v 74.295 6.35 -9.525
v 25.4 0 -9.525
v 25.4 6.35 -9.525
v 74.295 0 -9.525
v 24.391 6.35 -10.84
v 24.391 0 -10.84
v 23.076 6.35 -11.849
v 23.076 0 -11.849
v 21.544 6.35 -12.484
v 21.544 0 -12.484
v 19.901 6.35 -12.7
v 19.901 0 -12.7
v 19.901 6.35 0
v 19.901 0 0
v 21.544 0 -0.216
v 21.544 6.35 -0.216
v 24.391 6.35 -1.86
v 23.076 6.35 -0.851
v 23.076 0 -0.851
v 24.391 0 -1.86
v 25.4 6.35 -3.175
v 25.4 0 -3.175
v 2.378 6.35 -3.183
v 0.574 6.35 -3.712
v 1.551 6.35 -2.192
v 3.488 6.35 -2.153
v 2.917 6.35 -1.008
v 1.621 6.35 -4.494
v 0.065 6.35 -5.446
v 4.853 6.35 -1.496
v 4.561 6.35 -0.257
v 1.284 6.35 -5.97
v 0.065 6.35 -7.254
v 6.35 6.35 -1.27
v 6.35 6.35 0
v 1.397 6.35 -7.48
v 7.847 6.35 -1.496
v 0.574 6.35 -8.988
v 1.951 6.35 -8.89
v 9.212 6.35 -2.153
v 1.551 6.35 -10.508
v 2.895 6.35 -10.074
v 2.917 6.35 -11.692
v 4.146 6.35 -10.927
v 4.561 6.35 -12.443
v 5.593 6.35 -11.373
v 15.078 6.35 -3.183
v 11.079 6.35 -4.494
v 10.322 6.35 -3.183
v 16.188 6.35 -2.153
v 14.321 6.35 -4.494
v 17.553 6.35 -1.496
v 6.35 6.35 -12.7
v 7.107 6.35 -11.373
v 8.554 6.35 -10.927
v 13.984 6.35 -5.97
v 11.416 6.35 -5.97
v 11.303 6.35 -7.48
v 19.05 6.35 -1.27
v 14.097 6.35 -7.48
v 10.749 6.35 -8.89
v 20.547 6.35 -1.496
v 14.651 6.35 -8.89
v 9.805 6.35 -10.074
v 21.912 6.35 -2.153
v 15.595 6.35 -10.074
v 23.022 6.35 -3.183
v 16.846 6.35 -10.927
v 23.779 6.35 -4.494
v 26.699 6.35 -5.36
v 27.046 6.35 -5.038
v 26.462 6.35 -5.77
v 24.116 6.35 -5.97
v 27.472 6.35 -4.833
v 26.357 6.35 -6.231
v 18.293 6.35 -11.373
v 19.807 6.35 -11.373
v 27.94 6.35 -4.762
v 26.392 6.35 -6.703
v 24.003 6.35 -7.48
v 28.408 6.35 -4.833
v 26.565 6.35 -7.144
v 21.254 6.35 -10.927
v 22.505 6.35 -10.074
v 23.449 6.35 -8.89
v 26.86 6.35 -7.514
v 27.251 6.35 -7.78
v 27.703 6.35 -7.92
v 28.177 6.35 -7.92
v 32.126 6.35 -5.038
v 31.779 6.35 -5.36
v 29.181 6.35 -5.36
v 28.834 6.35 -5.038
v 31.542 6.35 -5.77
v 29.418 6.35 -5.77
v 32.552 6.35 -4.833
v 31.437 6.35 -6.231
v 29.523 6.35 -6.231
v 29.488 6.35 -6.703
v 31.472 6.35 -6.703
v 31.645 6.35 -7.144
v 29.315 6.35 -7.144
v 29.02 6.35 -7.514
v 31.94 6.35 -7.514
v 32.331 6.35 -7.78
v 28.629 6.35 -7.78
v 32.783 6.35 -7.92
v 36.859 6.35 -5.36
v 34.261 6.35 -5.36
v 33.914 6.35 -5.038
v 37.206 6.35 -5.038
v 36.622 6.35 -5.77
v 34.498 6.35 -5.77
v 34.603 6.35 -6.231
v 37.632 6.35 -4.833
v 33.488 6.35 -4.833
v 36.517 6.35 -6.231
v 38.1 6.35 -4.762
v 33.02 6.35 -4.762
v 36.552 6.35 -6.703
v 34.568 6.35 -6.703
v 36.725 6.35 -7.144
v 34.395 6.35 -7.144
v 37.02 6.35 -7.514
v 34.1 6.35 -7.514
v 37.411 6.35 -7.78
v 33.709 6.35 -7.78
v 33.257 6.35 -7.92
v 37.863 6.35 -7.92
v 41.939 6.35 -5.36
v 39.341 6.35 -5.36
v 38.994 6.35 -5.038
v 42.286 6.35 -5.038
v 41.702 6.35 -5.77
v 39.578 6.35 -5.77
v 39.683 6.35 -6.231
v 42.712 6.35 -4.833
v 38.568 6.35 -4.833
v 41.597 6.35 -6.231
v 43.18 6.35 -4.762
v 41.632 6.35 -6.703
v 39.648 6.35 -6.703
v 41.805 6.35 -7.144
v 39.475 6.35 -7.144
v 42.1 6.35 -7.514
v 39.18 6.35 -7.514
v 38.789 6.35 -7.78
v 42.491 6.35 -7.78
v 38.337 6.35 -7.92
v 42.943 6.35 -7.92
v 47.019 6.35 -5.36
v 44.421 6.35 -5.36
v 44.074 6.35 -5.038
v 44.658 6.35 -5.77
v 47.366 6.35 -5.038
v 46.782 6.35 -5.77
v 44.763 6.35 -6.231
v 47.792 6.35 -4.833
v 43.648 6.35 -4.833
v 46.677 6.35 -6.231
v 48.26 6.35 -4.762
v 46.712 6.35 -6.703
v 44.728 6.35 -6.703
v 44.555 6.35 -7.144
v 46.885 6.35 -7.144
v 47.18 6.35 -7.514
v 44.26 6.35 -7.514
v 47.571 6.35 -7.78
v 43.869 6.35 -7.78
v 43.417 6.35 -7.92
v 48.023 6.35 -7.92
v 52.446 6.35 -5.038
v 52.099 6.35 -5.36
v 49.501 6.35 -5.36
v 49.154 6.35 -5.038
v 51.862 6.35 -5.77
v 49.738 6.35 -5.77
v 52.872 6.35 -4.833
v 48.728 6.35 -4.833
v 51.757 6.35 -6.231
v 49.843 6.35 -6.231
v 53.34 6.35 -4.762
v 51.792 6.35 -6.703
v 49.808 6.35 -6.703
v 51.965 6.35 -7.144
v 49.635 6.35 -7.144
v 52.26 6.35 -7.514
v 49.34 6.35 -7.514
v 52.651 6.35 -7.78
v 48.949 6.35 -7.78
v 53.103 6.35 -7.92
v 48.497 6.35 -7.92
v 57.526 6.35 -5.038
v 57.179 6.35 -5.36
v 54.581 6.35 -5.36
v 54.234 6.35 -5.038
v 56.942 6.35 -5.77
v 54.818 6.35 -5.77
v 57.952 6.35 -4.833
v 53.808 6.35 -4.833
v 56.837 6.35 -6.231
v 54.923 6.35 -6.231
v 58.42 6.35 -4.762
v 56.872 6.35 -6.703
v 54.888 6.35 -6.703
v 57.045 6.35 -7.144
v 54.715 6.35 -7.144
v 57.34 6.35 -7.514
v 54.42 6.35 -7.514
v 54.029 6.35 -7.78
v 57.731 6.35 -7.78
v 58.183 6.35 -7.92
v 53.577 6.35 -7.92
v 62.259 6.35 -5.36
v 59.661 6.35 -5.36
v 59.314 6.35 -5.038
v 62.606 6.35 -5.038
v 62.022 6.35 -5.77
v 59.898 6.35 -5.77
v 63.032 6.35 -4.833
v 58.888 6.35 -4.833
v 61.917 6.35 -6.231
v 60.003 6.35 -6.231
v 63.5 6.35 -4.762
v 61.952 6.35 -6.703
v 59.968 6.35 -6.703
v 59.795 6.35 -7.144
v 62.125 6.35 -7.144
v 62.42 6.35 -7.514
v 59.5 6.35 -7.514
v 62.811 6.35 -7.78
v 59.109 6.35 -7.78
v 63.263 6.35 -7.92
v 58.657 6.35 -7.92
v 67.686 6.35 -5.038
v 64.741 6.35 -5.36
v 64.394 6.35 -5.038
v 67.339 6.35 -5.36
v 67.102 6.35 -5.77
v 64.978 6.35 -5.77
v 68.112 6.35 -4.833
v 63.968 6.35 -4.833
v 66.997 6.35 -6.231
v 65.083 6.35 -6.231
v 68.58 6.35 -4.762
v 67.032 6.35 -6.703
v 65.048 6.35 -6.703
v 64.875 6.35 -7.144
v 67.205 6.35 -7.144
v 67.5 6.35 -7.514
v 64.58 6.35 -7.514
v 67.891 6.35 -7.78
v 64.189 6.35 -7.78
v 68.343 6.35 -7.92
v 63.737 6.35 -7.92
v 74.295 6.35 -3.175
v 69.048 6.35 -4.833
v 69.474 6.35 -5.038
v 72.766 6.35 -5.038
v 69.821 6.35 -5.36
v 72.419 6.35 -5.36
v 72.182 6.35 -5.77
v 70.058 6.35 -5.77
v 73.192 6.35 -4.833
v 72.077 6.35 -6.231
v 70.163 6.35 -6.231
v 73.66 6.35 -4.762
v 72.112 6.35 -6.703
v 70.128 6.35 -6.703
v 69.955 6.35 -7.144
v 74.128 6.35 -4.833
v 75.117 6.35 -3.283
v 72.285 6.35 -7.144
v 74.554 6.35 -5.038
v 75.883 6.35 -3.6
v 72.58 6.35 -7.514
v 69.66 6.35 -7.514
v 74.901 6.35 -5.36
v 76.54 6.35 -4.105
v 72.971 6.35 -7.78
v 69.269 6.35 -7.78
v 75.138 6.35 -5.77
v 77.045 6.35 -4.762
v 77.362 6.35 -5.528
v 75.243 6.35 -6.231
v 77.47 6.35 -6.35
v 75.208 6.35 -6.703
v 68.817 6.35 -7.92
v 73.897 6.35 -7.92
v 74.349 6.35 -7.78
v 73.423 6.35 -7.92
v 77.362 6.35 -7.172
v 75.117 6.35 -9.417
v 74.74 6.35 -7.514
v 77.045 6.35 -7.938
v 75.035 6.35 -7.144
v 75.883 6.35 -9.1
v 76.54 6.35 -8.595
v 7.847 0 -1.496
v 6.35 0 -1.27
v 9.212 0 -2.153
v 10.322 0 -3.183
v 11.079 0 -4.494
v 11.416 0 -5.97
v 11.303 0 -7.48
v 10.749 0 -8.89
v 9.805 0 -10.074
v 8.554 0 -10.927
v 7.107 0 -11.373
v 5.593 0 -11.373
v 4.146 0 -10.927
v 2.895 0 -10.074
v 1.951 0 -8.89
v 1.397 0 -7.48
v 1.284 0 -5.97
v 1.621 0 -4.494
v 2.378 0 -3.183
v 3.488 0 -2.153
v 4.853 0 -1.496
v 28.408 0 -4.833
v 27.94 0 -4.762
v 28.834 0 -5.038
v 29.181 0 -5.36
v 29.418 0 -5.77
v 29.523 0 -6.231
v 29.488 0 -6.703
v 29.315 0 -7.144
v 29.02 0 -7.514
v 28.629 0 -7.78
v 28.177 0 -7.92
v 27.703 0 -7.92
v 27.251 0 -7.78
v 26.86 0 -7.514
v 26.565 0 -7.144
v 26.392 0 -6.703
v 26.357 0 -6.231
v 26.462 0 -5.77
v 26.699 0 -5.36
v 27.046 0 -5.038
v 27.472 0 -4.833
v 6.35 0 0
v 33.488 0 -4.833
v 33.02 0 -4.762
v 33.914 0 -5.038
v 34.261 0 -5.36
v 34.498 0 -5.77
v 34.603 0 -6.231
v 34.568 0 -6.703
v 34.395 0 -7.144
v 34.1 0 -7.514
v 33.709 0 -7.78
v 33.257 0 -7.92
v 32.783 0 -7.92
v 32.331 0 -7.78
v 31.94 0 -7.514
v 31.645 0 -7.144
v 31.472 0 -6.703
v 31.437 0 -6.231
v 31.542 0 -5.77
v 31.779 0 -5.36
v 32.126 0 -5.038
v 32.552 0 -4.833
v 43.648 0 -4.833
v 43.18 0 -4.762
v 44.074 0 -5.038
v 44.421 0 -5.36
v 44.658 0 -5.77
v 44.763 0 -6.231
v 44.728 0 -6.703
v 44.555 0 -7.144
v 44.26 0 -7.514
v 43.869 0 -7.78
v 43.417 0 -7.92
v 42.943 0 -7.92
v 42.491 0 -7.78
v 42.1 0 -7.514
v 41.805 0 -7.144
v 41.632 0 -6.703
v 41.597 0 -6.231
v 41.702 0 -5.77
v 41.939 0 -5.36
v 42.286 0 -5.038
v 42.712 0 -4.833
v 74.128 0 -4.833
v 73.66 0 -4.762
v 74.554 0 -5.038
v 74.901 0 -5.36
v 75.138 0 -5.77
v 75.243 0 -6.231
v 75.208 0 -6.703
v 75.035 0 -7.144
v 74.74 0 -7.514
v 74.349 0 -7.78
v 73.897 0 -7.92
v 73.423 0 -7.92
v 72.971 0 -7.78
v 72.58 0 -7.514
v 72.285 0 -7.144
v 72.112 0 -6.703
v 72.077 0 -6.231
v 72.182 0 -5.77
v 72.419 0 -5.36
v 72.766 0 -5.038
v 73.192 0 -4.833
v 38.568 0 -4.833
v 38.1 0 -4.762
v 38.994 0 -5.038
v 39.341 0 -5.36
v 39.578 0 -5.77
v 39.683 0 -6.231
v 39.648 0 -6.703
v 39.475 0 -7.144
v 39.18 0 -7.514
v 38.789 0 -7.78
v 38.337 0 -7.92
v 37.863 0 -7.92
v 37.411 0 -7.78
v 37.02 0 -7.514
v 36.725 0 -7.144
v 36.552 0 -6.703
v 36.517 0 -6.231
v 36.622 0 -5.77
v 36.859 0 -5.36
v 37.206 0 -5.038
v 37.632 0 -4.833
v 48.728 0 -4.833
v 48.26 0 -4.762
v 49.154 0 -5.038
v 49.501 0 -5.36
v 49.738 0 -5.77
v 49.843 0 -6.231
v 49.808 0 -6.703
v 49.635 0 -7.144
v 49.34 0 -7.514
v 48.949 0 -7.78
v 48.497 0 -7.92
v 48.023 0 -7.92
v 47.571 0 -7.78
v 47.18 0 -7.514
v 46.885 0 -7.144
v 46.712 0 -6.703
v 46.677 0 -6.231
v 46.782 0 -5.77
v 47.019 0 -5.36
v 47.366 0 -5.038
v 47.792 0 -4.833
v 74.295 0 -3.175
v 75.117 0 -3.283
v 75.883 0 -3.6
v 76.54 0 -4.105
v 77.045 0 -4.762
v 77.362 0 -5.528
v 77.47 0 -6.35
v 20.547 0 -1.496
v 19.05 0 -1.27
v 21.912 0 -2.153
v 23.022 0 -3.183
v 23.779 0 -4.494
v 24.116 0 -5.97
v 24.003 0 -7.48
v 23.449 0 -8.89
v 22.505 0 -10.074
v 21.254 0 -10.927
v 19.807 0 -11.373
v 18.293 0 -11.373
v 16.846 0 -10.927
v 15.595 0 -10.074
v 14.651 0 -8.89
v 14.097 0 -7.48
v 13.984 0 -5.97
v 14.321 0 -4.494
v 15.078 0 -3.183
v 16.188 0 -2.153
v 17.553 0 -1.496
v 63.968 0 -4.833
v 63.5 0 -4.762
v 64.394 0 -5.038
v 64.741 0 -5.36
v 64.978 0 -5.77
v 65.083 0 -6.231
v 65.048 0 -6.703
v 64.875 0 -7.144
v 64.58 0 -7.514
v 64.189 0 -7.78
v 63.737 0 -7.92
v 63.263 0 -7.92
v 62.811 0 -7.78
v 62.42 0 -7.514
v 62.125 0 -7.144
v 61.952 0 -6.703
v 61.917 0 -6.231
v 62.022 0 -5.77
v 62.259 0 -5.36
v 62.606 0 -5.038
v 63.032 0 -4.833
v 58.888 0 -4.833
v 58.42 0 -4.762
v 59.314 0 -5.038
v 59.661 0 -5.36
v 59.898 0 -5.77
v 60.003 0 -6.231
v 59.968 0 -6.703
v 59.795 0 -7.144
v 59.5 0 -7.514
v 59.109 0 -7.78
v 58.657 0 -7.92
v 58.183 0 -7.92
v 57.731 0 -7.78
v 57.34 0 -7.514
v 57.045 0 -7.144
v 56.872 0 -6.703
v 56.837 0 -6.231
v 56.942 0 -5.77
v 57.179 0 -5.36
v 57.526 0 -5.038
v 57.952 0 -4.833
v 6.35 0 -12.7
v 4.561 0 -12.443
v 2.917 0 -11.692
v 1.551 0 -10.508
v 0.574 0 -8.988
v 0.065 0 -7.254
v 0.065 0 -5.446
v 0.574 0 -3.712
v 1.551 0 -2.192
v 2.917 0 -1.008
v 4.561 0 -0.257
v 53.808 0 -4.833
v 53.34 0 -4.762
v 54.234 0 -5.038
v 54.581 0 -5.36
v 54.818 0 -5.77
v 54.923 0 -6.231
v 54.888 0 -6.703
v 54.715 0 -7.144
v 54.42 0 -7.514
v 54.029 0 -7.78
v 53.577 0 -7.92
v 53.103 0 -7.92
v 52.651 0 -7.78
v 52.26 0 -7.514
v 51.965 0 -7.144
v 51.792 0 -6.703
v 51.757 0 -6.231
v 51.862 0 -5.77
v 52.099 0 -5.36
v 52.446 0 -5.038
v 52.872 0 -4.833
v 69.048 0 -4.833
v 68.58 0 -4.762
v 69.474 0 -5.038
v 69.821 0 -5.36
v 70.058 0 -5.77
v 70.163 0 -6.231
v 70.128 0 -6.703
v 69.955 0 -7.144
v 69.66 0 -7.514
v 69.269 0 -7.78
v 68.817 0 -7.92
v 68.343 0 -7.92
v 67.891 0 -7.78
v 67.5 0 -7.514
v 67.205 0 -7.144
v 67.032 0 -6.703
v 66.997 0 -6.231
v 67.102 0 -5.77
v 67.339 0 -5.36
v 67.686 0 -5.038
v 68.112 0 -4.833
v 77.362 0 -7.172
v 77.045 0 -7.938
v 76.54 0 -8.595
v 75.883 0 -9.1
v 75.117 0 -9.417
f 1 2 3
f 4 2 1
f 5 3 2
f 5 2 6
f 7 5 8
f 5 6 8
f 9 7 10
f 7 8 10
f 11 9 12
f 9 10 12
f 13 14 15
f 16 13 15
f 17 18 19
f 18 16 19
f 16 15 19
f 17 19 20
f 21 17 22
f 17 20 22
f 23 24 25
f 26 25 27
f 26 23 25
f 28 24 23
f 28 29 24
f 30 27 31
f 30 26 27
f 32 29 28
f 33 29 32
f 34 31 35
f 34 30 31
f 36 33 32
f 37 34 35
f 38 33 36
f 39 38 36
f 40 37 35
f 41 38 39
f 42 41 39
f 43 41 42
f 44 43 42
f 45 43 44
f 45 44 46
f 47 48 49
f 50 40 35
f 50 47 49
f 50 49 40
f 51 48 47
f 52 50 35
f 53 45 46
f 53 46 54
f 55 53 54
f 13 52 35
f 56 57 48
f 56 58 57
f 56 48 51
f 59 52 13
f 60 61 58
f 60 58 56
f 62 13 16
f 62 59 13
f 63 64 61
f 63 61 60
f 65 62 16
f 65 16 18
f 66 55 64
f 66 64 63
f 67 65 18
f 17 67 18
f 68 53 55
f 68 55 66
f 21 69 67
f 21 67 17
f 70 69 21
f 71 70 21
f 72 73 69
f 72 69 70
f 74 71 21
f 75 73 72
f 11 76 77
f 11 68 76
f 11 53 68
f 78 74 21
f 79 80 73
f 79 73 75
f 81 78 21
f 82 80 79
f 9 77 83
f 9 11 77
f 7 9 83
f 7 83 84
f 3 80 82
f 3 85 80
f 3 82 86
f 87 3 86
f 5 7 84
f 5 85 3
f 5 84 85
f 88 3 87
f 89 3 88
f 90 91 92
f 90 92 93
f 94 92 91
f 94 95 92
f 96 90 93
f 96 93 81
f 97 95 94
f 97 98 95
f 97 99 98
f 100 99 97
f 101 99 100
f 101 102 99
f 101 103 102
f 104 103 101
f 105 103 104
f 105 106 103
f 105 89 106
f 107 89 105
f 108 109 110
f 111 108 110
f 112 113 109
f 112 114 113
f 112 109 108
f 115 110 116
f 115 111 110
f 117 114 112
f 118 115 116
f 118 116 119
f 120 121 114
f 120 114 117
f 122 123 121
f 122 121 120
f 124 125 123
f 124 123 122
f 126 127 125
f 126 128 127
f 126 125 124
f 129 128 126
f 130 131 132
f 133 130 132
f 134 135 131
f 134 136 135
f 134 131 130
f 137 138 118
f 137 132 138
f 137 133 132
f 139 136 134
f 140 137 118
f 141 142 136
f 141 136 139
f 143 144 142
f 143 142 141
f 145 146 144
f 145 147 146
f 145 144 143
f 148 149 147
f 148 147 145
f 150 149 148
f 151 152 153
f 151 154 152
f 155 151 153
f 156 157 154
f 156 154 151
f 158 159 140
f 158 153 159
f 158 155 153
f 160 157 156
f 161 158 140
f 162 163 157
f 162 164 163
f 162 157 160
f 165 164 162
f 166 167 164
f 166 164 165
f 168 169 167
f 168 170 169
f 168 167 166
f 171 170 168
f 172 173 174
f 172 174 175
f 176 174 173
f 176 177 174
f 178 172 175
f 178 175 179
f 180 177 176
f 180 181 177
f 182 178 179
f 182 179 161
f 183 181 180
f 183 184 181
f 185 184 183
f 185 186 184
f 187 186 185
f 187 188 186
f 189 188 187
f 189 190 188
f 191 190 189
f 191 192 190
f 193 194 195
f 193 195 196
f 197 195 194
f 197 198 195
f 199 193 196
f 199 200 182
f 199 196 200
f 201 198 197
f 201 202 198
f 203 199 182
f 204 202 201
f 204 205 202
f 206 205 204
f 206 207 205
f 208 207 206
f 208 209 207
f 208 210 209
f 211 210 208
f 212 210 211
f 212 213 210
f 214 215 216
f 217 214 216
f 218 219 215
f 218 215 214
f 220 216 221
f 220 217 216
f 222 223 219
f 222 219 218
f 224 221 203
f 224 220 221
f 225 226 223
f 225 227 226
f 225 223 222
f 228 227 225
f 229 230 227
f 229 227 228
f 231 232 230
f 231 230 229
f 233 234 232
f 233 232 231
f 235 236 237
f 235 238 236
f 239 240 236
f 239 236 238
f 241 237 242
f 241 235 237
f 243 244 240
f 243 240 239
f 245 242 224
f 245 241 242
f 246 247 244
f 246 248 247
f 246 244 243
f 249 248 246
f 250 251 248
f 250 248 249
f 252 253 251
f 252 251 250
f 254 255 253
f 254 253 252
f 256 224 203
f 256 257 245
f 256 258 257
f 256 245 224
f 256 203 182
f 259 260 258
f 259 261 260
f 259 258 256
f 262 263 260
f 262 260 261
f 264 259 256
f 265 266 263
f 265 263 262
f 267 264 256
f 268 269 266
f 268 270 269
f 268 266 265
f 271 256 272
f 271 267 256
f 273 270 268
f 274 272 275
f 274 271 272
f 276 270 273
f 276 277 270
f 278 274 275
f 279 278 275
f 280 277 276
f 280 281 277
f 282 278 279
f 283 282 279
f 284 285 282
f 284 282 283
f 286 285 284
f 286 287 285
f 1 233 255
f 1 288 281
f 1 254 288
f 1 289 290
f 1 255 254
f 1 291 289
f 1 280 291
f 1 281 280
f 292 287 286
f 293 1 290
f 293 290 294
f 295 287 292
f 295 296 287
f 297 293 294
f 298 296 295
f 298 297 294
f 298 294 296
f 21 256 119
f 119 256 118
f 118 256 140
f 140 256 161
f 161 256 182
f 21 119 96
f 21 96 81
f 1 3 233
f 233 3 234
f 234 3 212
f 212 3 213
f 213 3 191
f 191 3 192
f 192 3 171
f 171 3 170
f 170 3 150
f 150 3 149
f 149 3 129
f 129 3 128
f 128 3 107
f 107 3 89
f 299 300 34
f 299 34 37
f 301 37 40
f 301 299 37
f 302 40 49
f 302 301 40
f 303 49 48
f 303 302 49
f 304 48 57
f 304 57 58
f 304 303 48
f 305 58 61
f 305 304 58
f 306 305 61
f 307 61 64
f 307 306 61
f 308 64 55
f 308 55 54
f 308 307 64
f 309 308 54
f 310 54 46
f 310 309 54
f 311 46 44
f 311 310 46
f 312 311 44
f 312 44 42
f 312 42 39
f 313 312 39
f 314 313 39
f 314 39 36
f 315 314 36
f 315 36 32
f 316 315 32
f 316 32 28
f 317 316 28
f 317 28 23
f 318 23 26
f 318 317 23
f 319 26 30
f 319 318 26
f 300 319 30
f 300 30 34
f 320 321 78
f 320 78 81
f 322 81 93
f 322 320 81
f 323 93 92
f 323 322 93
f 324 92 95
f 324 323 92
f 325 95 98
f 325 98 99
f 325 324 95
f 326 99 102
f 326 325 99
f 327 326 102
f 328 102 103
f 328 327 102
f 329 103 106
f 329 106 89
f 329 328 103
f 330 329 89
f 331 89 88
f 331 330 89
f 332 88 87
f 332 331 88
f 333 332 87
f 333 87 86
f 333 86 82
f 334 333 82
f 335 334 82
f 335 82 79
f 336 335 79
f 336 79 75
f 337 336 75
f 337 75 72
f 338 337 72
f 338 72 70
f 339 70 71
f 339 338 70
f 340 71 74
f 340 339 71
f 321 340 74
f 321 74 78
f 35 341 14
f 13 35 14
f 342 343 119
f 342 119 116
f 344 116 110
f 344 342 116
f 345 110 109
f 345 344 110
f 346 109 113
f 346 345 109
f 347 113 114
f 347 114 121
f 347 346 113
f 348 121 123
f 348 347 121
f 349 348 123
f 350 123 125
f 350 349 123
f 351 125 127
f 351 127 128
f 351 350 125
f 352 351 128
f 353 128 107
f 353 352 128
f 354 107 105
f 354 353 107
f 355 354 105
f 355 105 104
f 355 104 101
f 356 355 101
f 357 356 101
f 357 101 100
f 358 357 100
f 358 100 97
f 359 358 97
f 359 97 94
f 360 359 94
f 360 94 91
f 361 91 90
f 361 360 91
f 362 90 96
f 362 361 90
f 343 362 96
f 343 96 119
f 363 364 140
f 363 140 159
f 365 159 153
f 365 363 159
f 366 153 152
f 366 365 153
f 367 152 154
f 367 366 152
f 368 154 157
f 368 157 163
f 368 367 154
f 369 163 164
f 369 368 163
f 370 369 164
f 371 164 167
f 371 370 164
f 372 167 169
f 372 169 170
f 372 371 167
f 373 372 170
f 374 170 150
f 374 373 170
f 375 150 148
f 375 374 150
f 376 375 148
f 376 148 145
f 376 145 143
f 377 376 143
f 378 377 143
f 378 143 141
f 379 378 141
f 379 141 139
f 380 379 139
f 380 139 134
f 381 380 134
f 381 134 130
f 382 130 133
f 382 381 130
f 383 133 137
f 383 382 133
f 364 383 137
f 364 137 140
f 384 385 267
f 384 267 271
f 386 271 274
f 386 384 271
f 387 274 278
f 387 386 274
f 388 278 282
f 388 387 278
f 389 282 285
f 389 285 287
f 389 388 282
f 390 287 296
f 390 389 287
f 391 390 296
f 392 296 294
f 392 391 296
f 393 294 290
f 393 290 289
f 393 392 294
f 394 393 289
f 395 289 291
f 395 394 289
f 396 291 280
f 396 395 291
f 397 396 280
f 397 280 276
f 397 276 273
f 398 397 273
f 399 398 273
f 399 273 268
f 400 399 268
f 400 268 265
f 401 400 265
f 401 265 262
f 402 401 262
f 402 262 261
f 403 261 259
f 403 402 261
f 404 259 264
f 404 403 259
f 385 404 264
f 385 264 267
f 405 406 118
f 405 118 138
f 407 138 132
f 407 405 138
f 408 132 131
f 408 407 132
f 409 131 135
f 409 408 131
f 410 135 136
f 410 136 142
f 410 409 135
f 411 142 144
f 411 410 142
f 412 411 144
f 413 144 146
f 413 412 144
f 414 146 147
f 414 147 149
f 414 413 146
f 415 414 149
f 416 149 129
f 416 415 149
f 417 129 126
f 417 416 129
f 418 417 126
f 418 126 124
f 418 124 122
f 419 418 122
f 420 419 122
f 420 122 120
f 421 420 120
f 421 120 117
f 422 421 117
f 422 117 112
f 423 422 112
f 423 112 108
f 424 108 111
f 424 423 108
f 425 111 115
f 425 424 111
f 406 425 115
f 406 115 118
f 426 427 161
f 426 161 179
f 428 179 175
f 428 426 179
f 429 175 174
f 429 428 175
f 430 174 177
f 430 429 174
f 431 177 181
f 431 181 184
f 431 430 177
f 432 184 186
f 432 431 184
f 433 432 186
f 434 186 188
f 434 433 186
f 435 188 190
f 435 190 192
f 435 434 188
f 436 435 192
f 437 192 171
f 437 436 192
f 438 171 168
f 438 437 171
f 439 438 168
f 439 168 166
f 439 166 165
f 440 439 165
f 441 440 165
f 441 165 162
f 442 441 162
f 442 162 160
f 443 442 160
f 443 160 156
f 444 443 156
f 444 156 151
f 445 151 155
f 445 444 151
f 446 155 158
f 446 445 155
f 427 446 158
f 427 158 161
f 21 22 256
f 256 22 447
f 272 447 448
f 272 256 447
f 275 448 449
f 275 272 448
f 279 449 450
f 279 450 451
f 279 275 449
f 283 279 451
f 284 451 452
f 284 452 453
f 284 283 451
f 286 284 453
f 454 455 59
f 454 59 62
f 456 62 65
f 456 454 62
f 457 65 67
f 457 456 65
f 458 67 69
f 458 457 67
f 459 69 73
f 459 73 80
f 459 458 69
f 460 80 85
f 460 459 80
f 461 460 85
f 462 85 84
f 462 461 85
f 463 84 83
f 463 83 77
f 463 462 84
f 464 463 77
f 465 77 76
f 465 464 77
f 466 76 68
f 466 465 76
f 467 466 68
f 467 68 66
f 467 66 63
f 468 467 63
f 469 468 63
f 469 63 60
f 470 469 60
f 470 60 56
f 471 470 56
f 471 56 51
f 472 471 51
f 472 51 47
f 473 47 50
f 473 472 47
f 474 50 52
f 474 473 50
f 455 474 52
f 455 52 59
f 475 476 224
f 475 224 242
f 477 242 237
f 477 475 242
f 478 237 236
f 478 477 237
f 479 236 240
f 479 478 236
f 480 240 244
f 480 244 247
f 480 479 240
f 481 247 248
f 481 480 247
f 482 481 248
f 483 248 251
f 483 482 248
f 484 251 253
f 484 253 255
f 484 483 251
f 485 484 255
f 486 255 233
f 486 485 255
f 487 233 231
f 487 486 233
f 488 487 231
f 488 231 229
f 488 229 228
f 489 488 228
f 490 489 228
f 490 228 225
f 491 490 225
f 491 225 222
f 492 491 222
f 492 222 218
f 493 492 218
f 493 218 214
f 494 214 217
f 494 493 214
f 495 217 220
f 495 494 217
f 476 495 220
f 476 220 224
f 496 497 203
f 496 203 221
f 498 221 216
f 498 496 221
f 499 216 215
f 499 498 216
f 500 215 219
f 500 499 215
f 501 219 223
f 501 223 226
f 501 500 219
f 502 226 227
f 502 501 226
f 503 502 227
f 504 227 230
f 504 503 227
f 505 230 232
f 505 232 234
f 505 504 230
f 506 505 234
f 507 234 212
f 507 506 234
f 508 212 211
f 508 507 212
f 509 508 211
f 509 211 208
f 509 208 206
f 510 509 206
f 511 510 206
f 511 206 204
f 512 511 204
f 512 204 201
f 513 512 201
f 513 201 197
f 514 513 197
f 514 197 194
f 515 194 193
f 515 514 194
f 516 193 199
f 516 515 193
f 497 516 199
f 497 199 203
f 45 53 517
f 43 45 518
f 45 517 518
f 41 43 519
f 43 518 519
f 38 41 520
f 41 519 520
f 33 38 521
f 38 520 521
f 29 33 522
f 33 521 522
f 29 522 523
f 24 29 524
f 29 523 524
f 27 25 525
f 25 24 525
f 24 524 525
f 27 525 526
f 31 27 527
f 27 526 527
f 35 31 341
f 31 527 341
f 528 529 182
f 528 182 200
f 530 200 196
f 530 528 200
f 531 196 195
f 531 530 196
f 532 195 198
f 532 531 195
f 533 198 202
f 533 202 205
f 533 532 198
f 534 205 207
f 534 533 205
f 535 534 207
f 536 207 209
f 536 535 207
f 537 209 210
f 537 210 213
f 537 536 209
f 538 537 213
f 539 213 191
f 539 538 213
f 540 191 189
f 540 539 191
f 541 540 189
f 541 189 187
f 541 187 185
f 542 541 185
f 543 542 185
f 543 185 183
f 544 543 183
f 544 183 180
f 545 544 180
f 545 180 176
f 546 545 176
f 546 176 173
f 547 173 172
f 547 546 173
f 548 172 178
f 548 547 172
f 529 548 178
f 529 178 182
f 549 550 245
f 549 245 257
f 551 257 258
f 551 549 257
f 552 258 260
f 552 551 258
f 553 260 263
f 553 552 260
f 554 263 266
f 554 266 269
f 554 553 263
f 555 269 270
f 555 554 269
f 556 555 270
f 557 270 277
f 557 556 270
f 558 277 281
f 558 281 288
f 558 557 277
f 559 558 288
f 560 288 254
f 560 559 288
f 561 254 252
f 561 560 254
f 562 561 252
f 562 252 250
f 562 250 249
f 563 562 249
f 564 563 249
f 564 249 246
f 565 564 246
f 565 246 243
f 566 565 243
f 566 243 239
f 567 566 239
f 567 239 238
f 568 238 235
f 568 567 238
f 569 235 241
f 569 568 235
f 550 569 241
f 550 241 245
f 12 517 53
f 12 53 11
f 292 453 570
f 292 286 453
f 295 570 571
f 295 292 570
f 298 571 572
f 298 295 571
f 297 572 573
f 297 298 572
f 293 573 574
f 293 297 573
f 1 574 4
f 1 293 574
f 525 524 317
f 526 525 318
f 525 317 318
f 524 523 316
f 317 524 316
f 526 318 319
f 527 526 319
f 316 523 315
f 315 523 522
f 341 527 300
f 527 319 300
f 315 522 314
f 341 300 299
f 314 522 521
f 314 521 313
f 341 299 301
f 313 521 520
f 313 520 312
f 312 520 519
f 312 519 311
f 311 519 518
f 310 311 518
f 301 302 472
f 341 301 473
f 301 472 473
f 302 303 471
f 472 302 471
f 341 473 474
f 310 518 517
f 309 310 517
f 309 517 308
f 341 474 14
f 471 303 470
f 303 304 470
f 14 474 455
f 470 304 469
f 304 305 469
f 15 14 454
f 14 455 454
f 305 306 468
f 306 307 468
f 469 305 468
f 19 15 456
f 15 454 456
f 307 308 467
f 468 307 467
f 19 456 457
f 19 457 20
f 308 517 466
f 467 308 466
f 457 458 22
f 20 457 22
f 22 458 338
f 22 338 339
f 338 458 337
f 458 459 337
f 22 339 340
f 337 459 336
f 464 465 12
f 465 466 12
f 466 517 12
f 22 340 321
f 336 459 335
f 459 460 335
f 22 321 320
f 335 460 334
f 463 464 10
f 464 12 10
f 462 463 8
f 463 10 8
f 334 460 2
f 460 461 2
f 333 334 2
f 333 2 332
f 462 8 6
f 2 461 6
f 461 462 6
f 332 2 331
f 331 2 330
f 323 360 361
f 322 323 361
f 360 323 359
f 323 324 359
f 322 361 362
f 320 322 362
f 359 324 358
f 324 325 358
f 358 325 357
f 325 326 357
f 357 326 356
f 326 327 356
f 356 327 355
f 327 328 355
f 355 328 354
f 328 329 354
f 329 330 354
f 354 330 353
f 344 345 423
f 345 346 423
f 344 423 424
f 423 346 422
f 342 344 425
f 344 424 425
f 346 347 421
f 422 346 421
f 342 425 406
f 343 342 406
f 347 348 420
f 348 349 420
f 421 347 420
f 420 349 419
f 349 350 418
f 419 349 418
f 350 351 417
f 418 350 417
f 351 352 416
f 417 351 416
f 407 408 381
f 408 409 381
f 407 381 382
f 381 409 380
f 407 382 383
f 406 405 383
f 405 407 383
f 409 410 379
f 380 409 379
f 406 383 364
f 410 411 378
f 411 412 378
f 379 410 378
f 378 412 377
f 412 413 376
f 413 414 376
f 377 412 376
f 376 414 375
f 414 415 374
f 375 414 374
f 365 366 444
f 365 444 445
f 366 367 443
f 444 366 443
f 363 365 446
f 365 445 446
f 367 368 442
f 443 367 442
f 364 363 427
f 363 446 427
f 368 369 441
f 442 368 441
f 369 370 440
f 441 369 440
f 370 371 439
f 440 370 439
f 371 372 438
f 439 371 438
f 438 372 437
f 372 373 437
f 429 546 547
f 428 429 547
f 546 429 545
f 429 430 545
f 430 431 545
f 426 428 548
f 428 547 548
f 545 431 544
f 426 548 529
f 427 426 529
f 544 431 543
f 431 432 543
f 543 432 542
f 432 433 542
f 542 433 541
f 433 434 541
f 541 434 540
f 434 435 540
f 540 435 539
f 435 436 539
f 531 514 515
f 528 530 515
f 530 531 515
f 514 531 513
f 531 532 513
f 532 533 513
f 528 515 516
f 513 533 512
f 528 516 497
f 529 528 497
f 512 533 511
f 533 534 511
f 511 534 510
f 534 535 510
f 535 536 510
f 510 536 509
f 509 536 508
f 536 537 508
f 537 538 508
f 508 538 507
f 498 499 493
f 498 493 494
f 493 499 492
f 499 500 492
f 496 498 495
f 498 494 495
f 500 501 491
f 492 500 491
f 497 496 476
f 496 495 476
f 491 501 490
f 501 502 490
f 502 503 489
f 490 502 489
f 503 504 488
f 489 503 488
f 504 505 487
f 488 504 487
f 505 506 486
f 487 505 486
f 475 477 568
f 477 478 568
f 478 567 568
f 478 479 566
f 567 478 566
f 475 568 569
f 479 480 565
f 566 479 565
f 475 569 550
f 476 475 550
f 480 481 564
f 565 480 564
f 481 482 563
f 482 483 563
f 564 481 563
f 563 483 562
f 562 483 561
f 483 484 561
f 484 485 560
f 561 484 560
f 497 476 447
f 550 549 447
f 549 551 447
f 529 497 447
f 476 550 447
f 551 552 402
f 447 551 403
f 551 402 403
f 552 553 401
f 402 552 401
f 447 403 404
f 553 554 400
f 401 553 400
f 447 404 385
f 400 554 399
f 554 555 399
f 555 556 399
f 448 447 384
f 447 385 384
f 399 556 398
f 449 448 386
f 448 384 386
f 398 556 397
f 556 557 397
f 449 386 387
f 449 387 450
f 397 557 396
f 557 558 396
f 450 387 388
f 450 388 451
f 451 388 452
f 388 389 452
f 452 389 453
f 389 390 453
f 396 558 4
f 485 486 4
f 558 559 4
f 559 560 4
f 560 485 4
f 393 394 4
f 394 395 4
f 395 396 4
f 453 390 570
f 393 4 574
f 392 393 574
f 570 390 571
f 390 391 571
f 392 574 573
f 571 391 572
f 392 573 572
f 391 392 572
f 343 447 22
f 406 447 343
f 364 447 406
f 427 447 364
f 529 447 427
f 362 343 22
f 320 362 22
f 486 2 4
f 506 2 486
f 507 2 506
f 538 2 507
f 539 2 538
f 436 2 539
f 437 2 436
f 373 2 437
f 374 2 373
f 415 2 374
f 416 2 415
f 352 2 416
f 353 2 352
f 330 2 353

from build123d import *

# Parameters (mm, degrees)
SKETCH1_W           = 25.4
SKETCH1_H           = 12.7
SKETCH1_R           = 5.08
SKETCH1_W_2         = 52.07
SKETCH1_H_2         = 6.35
SKETCH1_R_2         = 1.5875
BOSS_EXTRUDE1_DEPTH = 6.35
FILLET1_R           = 6.35
FILLET2_R           = 3.175


# Some blends are built 0.0001 mm under size
with BuildPart() as part:
    # Sketch1 → Boss-Extrude1 (new body)
    # profile 1 of 2: a face of its own
    with BuildSketch(Plane(origin=(0, 0, 0), x_dir=(1, 0, 0), z_dir=(0, 1, 0))):
        with Locations((12.7, 6.35)):
            Rectangle(SKETCH1_W, SKETCH1_H)
        with Locations(Location((19.05, 6.35, 0), (0, 0, 270))):
            Circle(SKETCH1_R, mode=Mode.SUBTRACT)
        with Locations(Location((6.35, 6.35, 0), (0, 0, 270))):
            Circle(SKETCH1_R, mode=Mode.SUBTRACT)
    # profile 2 of 2: a face of its own
    with BuildSketch(Plane(origin=(0, 0, 0), x_dir=(1, 0, 0), z_dir=(0, 1, 0))):
        with Locations((51.435, 6.35)):
            Rectangle(SKETCH1_W_2, SKETCH1_H_2)
        with Locations(Location((27.94, 6.35, 0), (0, 0, 270))):
            Circle(SKETCH1_R_2, mode=Mode.SUBTRACT)
        with Locations(Location((33.02, 6.35, 0), (0, 0, 270))):
            Circle(SKETCH1_R_2, mode=Mode.SUBTRACT)
        with Locations(Location((38.1, 6.35, 0), (0, 0, 270))):
            Circle(SKETCH1_R_2, mode=Mode.SUBTRACT)
        with Locations(Location((43.18, 6.35, 0), (0, 0, 270))):
            Circle(SKETCH1_R_2, mode=Mode.SUBTRACT)
        with Locations(Location((48.26, 6.35, 0), (0, 0, 270))):
            Circle(SKETCH1_R_2, mode=Mode.SUBTRACT)
        with Locations(Location((53.34, 6.35, 0), (0, 0, 270))):
            Circle(SKETCH1_R_2, mode=Mode.SUBTRACT)
        with Locations(Location((58.42, 6.35, 0), (0, 0, 270))):
            Circle(SKETCH1_R_2, mode=Mode.SUBTRACT)
        with Locations(Location((63.5, 6.35, 0), (0, 0, 270))):
            Circle(SKETCH1_R_2, mode=Mode.SUBTRACT)
        with Locations(Location((68.58, 6.35, 0), (0, 0, 270))):
            Circle(SKETCH1_R_2, mode=Mode.SUBTRACT)
        with Locations(Location((73.66, 6.35, 0), (0, 0, 270))):
            Circle(SKETCH1_R_2, mode=Mode.SUBTRACT)
    extrude(amount=BOSS_EXTRUDE1_DEPTH)

    # Fillet1
    # the kernel refuses this fillet: 6.35 mm, written as the material it takes off along each edge
    with BuildSketch(Plane(origin=(25.4, -13.748153285, -12.7), x_dir=(-1, 0, 0), z_dir=(0, 1, 0))) as fillet1_piece_1:
        with BuildLine():
            CenterArc((5.499261314, 6.35), FILLET1_R, 210, 60)
            Line((0, 3.175), (-0.109985226, 3.1115))
            ThreePointArc((-0.109985226, 3.1115), (-0.127, 1.5875), (-0.127, 0))
            Line((-0.127, 0), (0, -0.127))
            Line((0, -0.127), (5.499261314, -0.127))
            Line((5.499261314, -0.127), (5.499261314, 0))
        make_face()
    extrude(amount=33.84630657, mode=Mode.SUBTRACT)
    with BuildSketch(Plane(origin=(25.4, -13.748153285, 0), x_dir=(-1, 0, 0), z_dir=(0, 1, 0))) as fillet1_piece_2:
        with BuildLine():
            CenterArc((5.499261314, -6.35), FILLET1_R, 90, 60)
            Line((0, -3.175), (-0.109985226, -3.1115))
            ThreePointArc((-0.109985226, -3.1115), (-0.127, -1.5875), (-0.127, 0))
            Line((-0.127, 0), (0, 0.127))
            Line((0, 0.127), (5.499261314, 0.127))
            Line((5.499261314, 0.127), (5.499261314, 0))
        make_face()
    extrude(amount=33.84630657, mode=Mode.SUBTRACT)
    with BuildSketch(Plane(origin=(0, -15.875, -12.7), x_dir=(0, 0, 1), z_dir=(0, 1, 0)), Plane(origin=(0, -15.875, 0), x_dir=(1, 0, 0), z_dir=(0, 1, 0))) as fillet1_piece_3:
        with BuildLine():
            CenterArc((FILLET1_R, FILLET1_R), FILLET1_R, 180, 90)
            Line((0, FILLET1_R), (-FILLET1_R * 0.02, FILLET1_R))
            Line((-FILLET1_R * 0.02, FILLET1_R), (-FILLET1_R * 0.02, -FILLET1_R * 0.02))
            Line((-FILLET1_R * 0.02, -FILLET1_R * 0.02), (FILLET1_R, -FILLET1_R * 0.02))
            Line((FILLET1_R, -FILLET1_R * 0.02), (FILLET1_R, 0))
        make_face()
    extrude(amount=38.1, mode=Mode.SUBTRACT)

    # Fillet2
    fillet2_edges = [part.edges().sort_by_distance(p)[0] for p in [
        (77.47, 3.175, -9.525),
        (77.47, 3.175, -3.175),
    ]]
    fillet(fillet2_edges, radius=FILLET2_R - 0.0001)  # a hair under: the kernel refuses the full size


solid = part.part
